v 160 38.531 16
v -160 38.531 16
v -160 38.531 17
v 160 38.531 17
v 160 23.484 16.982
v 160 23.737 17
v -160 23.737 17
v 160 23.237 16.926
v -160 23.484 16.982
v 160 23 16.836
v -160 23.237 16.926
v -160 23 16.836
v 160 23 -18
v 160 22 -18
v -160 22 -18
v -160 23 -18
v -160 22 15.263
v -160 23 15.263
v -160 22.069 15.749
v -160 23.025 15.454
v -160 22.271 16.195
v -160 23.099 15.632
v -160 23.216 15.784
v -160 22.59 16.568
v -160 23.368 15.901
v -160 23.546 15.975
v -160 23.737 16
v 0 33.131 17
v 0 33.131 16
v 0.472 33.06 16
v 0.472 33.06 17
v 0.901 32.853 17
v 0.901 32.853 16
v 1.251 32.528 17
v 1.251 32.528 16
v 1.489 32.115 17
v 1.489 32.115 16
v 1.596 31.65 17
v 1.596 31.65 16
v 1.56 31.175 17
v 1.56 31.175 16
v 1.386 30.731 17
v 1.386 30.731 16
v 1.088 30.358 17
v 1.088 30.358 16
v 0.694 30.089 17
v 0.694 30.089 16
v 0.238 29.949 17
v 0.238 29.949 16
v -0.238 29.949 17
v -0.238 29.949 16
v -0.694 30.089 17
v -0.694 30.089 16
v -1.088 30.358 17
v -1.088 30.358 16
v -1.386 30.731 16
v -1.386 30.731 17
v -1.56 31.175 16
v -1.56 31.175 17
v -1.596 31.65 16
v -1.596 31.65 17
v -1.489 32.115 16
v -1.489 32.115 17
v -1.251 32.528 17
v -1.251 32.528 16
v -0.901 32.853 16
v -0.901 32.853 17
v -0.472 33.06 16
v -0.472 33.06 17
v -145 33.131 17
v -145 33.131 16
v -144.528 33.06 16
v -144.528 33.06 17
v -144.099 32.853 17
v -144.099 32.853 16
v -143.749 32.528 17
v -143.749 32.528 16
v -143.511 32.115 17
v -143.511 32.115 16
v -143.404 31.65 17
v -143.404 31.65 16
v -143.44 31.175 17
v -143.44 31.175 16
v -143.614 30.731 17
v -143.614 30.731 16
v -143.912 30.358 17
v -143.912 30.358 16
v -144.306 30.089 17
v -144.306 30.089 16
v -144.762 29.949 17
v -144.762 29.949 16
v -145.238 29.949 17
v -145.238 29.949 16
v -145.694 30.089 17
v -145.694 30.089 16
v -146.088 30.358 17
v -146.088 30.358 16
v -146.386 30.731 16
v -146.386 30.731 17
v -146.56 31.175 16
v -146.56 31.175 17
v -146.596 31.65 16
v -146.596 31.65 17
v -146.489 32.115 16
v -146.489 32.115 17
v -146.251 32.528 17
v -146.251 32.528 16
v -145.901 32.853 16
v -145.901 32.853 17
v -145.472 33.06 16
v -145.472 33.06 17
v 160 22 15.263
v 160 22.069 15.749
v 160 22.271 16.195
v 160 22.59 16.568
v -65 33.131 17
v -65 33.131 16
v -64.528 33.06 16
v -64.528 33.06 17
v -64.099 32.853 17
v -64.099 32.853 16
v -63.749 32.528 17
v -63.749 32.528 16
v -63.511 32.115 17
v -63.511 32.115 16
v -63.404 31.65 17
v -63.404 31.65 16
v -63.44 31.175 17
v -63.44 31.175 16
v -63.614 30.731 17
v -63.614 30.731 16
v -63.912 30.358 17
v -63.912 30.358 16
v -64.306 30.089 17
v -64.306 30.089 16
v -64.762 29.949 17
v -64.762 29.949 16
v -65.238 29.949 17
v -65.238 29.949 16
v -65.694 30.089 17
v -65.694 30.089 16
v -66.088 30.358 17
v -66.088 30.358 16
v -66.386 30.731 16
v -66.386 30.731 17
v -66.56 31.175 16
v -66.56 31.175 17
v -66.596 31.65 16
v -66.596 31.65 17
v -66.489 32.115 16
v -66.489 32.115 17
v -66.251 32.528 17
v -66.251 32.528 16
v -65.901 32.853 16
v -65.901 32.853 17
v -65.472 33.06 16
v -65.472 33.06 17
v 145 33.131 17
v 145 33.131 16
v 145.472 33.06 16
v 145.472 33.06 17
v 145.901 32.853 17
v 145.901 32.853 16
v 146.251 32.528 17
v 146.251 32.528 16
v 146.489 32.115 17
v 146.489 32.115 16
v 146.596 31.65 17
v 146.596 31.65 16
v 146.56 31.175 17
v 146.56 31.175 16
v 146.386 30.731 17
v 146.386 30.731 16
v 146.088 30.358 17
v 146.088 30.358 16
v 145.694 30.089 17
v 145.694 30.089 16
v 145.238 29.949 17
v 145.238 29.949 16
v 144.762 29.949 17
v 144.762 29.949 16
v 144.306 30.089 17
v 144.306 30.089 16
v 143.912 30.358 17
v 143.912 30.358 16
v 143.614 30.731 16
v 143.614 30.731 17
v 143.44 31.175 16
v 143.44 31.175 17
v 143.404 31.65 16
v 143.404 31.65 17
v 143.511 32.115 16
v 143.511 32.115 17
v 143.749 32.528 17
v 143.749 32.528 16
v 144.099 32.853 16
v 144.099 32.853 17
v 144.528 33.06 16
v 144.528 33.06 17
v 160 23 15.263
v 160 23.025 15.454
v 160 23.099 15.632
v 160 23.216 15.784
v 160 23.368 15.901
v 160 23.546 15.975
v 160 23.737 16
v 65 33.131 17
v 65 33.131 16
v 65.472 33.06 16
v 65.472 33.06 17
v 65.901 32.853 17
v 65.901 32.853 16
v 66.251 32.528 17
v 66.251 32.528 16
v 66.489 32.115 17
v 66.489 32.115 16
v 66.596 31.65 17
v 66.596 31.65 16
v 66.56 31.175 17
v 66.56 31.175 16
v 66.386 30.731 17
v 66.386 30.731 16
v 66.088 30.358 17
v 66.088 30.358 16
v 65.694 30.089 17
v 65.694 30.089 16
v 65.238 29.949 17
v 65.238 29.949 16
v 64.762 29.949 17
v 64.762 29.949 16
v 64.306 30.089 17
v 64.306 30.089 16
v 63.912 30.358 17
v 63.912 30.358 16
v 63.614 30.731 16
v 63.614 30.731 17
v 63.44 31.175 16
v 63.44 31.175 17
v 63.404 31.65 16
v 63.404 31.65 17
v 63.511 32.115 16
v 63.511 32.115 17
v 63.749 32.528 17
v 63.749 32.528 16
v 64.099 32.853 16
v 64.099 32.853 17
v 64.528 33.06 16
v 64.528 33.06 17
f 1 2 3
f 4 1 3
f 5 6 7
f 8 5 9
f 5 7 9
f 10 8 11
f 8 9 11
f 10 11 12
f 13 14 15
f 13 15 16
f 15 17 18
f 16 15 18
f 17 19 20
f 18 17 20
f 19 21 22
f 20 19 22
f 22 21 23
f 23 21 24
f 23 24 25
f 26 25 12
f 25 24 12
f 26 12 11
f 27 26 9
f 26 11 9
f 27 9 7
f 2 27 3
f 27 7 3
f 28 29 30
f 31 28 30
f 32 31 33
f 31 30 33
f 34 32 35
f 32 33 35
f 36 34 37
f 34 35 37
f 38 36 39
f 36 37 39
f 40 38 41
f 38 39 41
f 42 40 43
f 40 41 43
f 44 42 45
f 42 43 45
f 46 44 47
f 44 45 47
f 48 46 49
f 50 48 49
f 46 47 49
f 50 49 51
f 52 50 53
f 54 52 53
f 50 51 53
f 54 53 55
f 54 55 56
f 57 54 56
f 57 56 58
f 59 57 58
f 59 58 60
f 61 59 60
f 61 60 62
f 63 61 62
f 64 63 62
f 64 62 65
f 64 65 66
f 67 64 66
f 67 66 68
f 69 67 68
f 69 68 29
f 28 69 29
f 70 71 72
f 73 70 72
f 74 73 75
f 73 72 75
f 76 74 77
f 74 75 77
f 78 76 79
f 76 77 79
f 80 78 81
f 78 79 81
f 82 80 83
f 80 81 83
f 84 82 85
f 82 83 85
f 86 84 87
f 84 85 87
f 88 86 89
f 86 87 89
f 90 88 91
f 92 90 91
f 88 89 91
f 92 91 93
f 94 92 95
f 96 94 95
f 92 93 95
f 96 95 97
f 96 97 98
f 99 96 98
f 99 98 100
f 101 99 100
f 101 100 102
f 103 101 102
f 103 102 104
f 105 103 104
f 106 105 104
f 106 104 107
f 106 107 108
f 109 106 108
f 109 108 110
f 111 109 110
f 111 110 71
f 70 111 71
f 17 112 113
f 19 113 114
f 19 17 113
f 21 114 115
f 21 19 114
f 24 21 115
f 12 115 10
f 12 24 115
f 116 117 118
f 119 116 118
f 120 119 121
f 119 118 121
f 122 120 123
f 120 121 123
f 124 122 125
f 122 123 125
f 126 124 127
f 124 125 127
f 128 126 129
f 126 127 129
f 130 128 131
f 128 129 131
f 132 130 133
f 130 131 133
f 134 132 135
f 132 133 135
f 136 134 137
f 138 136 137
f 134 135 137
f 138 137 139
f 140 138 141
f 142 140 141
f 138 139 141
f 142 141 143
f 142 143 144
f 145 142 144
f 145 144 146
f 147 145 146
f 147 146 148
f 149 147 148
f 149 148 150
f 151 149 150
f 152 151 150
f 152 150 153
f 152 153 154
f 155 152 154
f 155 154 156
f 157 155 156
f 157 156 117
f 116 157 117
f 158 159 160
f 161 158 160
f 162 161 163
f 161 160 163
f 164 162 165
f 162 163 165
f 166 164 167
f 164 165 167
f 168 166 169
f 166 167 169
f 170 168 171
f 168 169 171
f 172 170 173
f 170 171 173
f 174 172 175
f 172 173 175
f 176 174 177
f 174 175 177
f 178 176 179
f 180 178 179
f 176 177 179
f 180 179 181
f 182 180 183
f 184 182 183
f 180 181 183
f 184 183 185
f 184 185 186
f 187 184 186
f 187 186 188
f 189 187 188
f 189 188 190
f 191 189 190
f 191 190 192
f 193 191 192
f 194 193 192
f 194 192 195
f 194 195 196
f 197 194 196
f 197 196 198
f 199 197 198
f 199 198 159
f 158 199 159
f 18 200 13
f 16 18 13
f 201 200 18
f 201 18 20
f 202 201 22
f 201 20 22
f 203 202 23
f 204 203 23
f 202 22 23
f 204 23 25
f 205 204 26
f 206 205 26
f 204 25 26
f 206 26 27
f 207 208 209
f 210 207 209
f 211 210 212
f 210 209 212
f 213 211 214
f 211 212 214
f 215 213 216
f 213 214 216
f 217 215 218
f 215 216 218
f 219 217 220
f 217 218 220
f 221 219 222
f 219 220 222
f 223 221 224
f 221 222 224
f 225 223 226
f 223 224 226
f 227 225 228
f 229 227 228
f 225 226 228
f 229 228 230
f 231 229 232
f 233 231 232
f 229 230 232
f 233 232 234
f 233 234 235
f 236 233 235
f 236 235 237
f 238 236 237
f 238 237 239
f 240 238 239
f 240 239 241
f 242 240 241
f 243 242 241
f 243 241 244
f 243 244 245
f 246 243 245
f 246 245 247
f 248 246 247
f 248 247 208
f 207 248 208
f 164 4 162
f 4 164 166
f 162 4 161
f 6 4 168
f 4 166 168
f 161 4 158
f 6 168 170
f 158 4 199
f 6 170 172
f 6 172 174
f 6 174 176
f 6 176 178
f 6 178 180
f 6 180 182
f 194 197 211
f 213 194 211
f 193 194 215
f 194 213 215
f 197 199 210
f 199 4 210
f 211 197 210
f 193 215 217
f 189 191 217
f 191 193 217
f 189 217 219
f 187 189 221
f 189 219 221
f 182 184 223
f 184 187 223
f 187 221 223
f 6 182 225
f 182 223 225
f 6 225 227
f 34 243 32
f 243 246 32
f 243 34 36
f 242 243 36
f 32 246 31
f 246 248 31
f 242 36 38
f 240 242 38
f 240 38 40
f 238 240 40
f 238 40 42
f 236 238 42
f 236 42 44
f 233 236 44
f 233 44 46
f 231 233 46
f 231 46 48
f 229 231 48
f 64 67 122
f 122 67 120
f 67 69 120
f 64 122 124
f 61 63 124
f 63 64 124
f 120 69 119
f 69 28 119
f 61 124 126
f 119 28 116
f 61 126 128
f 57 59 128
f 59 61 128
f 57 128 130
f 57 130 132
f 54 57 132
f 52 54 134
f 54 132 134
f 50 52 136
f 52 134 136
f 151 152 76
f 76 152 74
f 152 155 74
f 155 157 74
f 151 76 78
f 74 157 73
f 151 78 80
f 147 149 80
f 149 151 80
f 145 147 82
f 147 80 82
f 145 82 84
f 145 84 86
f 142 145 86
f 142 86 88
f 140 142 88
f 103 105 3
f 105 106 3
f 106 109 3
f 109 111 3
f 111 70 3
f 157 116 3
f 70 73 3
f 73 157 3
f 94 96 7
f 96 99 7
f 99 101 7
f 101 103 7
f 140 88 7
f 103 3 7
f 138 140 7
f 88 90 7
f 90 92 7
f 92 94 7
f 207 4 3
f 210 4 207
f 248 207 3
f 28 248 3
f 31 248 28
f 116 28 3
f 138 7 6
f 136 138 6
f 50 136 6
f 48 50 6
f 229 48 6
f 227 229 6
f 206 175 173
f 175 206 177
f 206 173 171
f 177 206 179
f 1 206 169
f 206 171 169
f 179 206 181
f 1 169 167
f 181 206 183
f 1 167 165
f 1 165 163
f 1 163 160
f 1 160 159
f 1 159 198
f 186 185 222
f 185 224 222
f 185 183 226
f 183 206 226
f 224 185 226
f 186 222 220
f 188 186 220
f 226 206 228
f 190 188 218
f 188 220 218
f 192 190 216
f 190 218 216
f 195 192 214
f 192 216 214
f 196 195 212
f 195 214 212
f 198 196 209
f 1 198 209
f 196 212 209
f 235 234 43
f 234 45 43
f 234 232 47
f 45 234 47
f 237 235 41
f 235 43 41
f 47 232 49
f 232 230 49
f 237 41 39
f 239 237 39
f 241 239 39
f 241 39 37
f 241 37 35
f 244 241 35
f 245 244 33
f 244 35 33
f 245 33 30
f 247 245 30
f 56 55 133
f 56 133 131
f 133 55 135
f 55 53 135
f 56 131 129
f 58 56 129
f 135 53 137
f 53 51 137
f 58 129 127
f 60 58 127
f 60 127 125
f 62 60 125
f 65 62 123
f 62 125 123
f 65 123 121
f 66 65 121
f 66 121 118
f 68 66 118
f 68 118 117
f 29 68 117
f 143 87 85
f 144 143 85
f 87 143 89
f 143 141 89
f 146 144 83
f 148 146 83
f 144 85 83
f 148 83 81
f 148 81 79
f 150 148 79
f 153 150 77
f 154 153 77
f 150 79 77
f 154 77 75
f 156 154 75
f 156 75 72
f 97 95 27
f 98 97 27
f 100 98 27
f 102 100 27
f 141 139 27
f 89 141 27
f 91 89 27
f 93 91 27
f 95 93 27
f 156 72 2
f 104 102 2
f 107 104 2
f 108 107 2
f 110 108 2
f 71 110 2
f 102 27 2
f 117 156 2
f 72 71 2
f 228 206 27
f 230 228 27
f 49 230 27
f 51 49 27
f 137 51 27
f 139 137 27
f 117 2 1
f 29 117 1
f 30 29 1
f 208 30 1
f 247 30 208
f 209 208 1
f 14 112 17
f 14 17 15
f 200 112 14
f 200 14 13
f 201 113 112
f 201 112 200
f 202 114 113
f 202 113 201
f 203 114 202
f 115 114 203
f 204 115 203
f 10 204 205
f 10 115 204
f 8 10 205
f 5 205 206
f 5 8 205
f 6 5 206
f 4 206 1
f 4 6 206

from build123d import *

# Parameters (mm, degrees)
SKETCH_1_W             = 50
SKETCH_1_H             = 1
SM_BASE_FLANGE_1_DEPTH = 160
OTHER_START            = -160
OTHER_1_DEPTH          = 320
OTHER_1_2_DEPTH        = 320
SKETCH_4_R             = 1.6
CUT_EXTRUDE_1_DEPTH    = 2


# Read off the part's stored shape, not the designer's step: 绘制的折弯1
# Sheet-metal steps are written as plain solids
with BuildPart() as part:
    # Sketch 1 → 基体-法兰1 (new, symmetric)
    with BuildSketch(Plane(origin=(0, 0, 0), x_dir=(0, 0, -1), z_dir=(1, 0, 0))):
        with Locations((-7, 22.5)):
            Rectangle(SKETCH_1_W, SKETCH_1_H)
    extrude(amount=SM_BASE_FLANGE_1_DEPTH, both=True)

    # Other 1 outline → Other 1 (cut)
    with BuildSketch(Plane.YZ.offset(OTHER_START)):
        with BuildLine():
            ThreePointArc((22, 15.2634), (22.271171885, 16.195226164), (23, 16.83604109))
            Line((23, 16.83604109), (23, 32))
            Line((23, 32), (22, 32))
            Line((22, 32), (22, 15.2634))
        make_face()
    extrude(amount=OTHER_1_DEPTH, mode=Mode.SUBTRACT)

    # Other 1 2 outline → Other 1 2 (add)
    with BuildSketch(Plane.YZ.offset(OTHER_START)):
        with BuildLine():
            ThreePointArc((23, 15.2634), (23.215745145, 15.784254855), (23.7366, 16))
            Line((23.7366, 16), (38.530753262, 16))
            Line((38.530753262, 16), (38.530753262, 17))
            Line((38.530753262, 17), (23.7366, 17))
            ThreePointArc((23.7366, 17), (23.359286442, 16.958514757), (23, 16.83604109))
            Line((23, 16.83604109), (23, 15.2634))
        make_face()
    extrude(amount=OTHER_1_2_DEPTH)

    # 草图4 → 切除-拉伸1 (cut)
    with BuildSketch(Plane(origin=(0, 0, 16), x_dir=(-1, 0, 0), z_dir=(0, 0, -1))):
        with Locations(Location((0, 31.530753262, 0), (0, 0, 90))):
            Circle(SKETCH_4_R)
        with Locations(Location((145, 31.530753262, 0), (0, 0, 90))):
            Circle(SKETCH_4_R)
        with Locations(Location((65, 31.530753262, 0), (0, 0, 90))):
            Circle(SKETCH_4_R)
        with Locations(Location((-145, 31.530753262, 0), (0, 0, 90))):
            Circle(SKETCH_4_R)
        with Locations(Location((-65, 31.530753262, 0), (0, 0, 90))):
            Circle(SKETCH_4_R)
    extrude(amount=-CUT_EXTRUDE_1_DEPTH, mode=Mode.SUBTRACT)


solid = part.part
